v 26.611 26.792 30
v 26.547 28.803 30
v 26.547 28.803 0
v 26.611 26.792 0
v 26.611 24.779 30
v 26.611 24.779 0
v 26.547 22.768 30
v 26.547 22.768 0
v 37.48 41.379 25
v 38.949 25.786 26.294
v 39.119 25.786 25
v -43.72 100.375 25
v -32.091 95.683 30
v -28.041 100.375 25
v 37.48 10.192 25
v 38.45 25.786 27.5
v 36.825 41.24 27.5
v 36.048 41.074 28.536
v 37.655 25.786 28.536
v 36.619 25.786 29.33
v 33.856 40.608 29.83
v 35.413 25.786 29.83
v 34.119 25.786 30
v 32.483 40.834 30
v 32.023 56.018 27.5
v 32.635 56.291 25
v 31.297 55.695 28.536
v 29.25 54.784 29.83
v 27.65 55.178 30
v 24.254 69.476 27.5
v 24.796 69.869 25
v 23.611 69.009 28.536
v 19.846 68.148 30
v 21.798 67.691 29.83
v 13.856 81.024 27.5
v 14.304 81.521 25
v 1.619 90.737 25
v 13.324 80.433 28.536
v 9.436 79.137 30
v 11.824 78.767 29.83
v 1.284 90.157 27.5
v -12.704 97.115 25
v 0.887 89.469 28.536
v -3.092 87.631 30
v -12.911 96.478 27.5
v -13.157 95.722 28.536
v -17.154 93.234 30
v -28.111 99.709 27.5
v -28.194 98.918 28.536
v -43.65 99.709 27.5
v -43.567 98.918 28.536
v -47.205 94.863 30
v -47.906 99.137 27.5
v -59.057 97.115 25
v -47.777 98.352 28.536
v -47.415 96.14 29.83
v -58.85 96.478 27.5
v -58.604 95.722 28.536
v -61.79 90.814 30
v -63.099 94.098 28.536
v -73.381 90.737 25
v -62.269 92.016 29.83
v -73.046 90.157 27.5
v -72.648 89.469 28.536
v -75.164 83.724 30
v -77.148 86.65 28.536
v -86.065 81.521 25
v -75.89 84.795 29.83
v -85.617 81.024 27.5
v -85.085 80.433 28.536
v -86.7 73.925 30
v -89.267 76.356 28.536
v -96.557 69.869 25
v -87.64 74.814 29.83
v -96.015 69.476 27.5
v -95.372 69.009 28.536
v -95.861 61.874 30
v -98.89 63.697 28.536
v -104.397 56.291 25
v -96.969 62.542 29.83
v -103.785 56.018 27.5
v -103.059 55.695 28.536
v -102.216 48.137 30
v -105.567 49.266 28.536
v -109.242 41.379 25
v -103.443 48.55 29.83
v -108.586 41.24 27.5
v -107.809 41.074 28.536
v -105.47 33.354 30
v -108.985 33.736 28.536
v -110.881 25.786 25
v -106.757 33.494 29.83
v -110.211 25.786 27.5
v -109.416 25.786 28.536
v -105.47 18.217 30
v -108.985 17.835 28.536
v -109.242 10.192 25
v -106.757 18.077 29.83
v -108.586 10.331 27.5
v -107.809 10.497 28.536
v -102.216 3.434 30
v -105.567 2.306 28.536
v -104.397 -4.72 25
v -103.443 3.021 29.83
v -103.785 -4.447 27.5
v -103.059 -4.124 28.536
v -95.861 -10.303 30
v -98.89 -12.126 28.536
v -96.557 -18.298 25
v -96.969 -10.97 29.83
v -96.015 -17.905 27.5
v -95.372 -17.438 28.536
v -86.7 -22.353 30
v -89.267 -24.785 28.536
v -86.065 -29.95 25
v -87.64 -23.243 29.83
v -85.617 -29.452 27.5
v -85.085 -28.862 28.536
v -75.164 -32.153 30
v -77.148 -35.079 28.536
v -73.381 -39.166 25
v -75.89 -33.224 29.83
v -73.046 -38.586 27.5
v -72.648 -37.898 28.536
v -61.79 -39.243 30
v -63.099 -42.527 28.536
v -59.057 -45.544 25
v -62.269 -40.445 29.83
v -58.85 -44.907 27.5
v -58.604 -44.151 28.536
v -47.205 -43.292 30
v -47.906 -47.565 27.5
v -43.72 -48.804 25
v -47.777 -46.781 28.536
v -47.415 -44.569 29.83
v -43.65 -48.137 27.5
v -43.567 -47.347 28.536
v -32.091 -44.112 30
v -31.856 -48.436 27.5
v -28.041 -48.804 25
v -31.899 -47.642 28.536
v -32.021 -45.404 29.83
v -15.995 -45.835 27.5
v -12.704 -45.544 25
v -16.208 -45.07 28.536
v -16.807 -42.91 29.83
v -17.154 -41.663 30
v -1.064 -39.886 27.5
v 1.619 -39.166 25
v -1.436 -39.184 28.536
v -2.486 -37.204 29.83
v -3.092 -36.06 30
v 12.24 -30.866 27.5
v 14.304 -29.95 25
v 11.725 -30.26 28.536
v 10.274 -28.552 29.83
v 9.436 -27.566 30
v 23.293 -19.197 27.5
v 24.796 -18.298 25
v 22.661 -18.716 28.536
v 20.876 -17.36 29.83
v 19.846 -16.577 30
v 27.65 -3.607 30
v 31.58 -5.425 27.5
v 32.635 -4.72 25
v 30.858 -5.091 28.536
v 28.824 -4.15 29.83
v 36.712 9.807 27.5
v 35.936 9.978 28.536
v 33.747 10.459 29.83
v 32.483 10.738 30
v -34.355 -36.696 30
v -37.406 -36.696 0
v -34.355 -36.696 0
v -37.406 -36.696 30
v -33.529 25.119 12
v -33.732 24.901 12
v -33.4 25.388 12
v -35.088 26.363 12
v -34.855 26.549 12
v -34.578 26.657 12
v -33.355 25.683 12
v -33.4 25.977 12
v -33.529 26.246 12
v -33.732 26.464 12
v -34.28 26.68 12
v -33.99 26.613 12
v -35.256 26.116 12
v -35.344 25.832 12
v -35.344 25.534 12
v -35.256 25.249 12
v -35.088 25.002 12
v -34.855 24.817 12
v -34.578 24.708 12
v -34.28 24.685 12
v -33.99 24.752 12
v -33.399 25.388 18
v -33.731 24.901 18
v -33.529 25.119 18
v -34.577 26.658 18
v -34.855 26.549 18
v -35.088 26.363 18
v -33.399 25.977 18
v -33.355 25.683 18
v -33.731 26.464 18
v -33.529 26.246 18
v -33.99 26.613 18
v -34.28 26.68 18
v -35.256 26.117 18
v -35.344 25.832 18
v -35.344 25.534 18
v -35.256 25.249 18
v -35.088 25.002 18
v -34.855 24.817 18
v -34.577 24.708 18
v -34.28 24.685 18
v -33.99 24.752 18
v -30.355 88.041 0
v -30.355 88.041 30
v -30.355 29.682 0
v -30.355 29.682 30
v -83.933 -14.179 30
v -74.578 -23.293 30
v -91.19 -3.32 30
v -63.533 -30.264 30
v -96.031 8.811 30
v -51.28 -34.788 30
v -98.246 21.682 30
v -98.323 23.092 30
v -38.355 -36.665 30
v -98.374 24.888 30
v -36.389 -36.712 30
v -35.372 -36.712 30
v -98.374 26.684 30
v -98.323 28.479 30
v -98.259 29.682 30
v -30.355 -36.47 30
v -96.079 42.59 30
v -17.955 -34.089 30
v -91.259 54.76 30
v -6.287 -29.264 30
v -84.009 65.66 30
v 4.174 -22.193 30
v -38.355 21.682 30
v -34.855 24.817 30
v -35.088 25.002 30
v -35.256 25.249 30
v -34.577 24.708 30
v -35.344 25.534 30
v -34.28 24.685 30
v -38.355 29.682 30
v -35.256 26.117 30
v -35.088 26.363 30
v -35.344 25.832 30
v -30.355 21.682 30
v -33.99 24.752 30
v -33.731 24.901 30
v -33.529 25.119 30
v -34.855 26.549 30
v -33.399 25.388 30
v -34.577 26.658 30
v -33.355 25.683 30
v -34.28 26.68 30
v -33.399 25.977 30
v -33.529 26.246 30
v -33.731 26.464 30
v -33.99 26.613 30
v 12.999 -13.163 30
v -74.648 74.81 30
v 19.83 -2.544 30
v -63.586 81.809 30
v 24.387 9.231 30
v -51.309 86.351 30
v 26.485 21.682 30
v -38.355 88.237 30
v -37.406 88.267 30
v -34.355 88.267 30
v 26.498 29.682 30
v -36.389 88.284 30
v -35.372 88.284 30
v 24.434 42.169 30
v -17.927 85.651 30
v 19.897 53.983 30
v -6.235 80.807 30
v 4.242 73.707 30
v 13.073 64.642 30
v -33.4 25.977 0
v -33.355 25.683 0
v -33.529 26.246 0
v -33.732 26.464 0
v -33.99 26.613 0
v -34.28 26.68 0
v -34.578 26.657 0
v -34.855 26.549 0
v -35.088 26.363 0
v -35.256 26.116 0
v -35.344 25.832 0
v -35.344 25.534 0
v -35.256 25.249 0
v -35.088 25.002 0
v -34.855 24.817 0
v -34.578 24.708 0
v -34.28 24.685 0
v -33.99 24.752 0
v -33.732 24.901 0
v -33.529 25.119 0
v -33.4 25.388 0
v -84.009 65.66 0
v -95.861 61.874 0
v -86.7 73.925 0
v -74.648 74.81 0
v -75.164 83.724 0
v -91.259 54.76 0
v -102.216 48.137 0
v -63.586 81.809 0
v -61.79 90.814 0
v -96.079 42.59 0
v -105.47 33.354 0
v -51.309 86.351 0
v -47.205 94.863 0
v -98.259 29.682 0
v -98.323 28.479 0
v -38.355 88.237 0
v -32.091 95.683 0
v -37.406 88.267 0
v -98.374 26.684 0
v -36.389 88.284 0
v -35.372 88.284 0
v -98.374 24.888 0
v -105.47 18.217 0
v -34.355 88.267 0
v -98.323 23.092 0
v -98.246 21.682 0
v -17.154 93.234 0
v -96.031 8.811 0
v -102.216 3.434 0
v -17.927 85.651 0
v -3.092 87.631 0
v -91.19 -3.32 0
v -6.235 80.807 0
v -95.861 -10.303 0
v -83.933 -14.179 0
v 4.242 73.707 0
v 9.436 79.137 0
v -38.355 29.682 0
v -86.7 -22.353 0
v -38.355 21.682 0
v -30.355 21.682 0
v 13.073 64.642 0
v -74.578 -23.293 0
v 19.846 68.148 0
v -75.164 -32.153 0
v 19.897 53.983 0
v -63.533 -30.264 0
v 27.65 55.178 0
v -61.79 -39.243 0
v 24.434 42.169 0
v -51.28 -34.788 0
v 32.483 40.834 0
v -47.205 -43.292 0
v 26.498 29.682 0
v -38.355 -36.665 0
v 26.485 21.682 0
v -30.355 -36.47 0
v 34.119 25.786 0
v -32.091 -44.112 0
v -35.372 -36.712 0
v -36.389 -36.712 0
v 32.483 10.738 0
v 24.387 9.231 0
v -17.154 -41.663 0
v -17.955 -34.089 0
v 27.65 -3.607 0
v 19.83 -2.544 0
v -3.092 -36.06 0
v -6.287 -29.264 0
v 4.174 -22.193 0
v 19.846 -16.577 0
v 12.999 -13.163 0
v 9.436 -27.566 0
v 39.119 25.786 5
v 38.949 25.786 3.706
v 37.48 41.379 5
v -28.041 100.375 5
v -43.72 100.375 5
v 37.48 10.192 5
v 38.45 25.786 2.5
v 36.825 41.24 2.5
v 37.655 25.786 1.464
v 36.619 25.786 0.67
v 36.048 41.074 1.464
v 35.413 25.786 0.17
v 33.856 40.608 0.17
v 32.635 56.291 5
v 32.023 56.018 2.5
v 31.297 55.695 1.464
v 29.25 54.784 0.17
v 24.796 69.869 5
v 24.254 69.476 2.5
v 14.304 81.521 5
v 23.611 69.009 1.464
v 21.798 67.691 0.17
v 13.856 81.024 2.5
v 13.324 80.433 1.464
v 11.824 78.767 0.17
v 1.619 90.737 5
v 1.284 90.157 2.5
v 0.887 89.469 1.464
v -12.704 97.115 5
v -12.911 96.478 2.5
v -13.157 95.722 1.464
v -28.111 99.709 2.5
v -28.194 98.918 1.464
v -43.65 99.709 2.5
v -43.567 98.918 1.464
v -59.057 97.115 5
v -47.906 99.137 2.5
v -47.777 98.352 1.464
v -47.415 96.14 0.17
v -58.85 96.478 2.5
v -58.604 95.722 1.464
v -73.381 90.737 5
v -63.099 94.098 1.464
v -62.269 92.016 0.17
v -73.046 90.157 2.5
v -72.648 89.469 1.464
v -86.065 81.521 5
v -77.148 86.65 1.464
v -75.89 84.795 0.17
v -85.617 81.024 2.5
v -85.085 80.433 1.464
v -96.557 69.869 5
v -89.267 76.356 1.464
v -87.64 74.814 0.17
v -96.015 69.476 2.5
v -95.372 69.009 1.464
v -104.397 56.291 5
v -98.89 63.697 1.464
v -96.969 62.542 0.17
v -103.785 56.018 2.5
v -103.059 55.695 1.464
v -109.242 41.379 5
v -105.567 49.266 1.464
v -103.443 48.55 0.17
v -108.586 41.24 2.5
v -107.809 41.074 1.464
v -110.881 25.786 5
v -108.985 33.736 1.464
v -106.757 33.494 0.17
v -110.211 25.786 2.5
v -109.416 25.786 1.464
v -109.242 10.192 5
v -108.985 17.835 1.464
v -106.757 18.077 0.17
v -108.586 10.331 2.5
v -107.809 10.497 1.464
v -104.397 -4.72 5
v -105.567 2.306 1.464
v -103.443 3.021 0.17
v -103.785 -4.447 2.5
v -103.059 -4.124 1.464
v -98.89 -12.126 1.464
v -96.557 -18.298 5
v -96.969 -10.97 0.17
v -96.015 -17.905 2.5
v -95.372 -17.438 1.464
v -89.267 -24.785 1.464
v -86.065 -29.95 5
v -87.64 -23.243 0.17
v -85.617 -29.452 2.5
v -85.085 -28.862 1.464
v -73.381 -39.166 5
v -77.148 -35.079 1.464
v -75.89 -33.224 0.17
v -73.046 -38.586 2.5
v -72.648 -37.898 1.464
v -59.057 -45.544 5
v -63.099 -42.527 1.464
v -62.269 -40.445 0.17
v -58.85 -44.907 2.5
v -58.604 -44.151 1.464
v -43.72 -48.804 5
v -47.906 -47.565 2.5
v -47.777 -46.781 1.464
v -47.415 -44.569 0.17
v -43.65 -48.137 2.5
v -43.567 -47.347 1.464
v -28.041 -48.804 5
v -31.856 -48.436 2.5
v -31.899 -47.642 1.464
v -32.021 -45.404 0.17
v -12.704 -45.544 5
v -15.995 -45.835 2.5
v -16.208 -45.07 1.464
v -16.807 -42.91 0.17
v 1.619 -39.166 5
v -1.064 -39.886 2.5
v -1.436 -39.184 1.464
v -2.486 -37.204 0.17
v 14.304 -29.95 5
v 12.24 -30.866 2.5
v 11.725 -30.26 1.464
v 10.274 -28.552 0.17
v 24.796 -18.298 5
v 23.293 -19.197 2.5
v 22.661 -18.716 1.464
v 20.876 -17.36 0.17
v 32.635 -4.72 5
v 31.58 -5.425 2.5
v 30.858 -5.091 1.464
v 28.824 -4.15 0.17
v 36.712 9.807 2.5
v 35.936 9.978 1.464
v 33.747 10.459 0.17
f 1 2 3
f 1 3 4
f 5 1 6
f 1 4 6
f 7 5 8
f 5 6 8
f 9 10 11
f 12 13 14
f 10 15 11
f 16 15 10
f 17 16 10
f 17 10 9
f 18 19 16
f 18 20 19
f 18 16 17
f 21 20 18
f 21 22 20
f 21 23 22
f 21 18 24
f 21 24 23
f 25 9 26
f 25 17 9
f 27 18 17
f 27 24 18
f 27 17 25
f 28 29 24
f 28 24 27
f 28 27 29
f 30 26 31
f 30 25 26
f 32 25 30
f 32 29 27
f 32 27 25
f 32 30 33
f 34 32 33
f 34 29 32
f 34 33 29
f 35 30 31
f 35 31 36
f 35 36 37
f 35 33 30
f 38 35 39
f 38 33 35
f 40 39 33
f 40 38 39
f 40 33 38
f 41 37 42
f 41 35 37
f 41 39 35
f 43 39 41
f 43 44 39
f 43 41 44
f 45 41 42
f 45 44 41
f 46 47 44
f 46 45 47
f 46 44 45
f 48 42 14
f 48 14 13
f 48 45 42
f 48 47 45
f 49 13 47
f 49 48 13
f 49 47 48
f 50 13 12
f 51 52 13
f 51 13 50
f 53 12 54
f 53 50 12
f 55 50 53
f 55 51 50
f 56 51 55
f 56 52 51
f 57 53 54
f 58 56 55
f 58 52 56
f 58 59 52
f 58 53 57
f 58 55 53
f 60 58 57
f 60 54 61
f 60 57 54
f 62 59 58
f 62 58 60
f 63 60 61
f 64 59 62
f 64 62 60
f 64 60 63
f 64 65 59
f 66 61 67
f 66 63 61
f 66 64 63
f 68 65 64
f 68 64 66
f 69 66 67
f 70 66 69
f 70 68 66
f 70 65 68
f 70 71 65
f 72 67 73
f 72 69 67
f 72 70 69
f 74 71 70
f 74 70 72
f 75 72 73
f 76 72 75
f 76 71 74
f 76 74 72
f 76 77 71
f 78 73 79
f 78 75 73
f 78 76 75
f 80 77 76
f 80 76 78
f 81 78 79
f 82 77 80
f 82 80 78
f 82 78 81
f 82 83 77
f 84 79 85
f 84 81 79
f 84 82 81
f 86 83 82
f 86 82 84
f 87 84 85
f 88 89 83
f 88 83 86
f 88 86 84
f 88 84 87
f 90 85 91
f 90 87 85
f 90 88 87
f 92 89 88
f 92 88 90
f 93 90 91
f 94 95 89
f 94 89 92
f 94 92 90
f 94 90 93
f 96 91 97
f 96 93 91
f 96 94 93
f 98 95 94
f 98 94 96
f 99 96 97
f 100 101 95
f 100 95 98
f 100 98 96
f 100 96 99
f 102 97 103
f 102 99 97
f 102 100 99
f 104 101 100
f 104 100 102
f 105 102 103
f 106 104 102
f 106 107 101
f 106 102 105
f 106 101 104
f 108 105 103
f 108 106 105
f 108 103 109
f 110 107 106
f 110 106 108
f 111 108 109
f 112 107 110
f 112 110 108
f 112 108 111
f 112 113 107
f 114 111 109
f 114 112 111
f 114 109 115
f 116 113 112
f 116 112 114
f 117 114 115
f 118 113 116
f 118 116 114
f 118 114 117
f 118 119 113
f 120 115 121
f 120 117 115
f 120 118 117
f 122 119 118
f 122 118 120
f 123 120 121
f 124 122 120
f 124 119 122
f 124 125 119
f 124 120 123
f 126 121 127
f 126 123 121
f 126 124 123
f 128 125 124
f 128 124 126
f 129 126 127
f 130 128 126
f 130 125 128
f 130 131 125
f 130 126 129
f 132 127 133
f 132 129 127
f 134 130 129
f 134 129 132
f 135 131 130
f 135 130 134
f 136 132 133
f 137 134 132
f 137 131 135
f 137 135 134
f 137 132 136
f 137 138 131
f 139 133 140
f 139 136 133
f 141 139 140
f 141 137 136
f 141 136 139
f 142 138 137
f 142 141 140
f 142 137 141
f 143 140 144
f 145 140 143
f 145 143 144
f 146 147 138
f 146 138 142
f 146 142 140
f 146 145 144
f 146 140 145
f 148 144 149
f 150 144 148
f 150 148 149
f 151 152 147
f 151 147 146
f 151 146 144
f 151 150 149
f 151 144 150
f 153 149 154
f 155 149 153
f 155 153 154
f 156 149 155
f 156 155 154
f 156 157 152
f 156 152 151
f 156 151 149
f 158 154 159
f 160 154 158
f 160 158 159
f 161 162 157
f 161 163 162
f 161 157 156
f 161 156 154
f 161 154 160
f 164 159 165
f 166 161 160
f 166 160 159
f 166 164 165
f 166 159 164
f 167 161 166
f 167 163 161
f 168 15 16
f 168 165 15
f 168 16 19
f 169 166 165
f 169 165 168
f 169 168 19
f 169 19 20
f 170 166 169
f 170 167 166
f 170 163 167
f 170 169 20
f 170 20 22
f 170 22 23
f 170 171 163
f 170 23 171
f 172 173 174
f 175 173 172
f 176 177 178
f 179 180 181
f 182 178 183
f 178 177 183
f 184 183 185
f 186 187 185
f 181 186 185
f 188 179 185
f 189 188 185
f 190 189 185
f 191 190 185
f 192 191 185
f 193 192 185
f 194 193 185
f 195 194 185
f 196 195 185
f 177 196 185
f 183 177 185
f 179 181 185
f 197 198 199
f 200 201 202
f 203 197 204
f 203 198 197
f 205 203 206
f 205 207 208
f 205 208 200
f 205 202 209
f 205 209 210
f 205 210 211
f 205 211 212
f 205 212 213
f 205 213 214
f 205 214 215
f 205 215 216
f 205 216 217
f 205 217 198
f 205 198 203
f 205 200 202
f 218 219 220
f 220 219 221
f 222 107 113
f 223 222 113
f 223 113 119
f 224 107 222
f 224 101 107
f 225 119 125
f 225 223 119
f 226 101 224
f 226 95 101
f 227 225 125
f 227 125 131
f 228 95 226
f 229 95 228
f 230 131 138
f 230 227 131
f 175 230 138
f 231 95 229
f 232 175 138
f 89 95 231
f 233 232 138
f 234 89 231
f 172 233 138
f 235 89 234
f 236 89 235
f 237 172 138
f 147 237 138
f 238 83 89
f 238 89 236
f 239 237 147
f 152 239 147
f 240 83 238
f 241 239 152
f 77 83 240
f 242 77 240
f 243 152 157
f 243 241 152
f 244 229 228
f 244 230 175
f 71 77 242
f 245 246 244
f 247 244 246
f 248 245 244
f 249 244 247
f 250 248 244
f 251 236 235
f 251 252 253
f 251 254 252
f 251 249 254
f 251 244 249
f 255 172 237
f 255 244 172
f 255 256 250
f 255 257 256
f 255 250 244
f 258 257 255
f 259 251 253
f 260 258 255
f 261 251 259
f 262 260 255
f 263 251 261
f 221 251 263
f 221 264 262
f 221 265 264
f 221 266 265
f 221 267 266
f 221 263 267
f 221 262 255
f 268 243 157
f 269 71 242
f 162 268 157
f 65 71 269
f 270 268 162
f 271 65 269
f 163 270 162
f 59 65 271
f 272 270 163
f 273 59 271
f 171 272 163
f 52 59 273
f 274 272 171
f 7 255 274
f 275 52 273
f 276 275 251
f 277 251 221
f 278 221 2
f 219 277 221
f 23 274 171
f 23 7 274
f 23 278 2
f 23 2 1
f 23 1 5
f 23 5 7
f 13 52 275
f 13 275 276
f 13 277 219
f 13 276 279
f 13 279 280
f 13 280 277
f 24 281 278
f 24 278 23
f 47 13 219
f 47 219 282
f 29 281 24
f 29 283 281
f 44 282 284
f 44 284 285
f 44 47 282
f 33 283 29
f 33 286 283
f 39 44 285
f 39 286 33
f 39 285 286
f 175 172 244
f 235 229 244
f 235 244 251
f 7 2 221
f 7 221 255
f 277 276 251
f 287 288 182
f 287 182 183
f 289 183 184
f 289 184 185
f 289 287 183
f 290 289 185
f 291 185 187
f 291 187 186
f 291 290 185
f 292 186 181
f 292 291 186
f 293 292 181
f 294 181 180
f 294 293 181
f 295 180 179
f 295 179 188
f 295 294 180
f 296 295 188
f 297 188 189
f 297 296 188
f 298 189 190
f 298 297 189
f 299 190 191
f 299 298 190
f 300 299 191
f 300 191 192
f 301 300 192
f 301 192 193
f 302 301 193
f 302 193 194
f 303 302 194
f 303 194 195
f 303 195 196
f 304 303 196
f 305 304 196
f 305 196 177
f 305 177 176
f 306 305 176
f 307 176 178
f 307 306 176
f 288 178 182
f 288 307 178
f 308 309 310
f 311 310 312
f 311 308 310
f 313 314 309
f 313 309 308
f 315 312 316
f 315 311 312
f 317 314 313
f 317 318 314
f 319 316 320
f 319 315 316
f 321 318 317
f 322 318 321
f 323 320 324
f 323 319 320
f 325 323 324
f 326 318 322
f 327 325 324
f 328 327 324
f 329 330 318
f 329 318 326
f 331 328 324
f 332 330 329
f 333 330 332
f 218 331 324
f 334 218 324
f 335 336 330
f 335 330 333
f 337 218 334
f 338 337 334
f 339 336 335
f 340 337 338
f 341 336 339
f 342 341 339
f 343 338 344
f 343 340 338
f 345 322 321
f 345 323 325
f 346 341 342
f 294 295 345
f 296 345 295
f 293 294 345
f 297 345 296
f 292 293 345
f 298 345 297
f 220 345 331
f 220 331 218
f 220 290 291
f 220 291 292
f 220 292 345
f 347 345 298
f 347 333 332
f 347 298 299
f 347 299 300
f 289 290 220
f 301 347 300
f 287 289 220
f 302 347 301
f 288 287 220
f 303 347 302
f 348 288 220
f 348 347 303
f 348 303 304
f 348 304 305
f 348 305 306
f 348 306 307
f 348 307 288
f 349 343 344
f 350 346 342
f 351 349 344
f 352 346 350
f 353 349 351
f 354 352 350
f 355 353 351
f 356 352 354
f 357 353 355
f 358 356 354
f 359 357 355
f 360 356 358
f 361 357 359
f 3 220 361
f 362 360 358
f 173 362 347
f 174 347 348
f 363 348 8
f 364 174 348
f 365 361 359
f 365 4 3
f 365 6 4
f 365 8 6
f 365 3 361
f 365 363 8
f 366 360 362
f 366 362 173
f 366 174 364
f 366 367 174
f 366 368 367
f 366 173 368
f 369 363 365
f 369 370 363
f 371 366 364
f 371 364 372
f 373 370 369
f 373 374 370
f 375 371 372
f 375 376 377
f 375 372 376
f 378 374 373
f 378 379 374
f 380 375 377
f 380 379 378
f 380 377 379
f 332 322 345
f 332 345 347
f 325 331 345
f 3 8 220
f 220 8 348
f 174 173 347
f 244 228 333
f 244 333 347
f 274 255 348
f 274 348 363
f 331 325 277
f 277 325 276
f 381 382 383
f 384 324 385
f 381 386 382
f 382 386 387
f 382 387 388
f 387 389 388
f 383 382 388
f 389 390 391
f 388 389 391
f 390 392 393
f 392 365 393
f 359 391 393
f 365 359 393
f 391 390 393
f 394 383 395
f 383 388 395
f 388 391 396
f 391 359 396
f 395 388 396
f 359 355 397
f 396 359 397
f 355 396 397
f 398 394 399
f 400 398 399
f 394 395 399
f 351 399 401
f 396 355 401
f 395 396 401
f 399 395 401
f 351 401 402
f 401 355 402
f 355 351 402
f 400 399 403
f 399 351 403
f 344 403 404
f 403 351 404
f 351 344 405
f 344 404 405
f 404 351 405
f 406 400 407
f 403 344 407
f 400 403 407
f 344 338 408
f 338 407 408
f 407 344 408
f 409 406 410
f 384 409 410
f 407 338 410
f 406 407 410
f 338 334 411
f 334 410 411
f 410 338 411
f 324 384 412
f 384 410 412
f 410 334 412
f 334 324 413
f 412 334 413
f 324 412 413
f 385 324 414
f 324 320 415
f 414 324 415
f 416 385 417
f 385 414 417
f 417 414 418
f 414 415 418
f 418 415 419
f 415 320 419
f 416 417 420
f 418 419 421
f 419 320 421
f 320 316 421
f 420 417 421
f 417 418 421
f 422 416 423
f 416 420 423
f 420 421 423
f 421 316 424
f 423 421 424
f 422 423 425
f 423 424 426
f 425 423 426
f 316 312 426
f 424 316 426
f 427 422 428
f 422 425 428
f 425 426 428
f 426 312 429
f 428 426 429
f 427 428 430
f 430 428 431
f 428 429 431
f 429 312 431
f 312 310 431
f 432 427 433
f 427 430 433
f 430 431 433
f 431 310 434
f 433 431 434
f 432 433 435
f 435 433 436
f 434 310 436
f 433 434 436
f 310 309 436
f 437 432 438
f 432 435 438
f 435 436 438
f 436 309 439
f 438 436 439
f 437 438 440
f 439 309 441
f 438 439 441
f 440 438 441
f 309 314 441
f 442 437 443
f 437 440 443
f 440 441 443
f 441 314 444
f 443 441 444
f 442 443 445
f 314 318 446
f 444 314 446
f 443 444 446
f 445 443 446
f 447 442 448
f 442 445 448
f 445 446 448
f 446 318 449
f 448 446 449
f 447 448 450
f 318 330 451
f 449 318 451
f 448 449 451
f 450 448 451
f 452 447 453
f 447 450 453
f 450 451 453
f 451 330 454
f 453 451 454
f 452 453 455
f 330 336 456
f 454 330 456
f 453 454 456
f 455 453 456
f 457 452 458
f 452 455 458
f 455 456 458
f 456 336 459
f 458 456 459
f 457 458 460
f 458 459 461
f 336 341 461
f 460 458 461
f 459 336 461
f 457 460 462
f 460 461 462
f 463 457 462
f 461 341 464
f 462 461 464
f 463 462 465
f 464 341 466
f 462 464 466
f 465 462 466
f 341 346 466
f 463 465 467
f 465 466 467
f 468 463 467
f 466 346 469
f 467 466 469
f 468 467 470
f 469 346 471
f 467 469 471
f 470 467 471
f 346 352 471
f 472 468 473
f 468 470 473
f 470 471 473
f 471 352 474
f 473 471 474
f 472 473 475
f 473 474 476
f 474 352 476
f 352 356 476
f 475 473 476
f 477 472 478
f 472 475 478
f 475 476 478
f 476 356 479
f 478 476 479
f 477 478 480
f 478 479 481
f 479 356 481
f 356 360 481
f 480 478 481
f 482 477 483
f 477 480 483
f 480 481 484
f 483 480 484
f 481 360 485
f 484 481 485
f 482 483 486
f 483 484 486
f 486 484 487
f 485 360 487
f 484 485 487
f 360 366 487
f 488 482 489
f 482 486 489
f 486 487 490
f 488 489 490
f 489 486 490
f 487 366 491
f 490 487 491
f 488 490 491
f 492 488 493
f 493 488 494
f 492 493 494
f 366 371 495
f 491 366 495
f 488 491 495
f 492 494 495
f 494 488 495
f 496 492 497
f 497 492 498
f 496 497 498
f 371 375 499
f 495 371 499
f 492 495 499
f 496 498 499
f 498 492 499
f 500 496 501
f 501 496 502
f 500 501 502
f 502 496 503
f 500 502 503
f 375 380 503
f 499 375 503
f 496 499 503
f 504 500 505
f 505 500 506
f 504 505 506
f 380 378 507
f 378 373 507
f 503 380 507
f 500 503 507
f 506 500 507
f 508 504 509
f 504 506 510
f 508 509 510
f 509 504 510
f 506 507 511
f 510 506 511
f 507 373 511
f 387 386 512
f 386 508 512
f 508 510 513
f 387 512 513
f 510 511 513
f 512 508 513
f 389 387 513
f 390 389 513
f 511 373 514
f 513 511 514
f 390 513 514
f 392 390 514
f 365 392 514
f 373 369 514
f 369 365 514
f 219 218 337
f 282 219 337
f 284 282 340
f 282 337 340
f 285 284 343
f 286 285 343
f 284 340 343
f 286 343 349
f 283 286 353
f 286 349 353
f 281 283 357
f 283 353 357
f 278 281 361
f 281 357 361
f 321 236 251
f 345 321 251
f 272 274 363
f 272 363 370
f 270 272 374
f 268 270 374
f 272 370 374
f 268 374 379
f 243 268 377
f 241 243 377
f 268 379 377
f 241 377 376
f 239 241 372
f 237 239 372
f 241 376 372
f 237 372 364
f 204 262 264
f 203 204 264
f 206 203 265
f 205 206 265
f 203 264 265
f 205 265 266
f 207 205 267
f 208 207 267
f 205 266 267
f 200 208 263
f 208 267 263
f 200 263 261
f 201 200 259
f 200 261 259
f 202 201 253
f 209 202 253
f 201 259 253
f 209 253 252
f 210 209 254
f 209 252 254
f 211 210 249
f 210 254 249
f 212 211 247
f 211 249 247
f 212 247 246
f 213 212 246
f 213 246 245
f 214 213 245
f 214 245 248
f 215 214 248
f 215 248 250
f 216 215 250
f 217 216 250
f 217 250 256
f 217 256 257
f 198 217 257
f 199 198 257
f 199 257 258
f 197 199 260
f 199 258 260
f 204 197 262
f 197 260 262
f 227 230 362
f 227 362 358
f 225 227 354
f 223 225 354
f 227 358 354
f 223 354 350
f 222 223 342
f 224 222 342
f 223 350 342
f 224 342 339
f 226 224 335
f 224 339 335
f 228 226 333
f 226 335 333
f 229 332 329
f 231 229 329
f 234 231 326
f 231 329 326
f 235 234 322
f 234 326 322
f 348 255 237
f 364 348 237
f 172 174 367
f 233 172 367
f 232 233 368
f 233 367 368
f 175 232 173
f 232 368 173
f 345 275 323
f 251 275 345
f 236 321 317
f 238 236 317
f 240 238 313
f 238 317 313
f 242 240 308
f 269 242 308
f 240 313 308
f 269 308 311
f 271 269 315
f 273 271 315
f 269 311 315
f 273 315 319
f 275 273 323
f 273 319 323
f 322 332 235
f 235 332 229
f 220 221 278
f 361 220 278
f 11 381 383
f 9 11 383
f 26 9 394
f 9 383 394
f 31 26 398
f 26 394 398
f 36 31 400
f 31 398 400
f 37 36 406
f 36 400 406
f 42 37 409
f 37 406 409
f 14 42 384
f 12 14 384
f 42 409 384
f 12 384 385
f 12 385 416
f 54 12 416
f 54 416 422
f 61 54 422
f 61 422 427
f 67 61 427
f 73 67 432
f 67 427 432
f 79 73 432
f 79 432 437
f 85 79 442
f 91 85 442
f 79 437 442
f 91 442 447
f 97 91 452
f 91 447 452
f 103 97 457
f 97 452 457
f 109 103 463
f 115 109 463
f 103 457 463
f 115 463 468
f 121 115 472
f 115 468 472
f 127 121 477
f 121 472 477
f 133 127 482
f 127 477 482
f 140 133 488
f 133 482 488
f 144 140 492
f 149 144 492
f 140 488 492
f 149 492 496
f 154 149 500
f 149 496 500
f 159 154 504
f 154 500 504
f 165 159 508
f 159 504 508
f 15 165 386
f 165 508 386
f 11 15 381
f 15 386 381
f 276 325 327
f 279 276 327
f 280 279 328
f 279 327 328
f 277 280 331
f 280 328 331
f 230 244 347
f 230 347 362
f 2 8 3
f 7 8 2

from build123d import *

# Parameters (mm, degrees)
F0_R      = 75
F1_DEPTH  = 30
F2_R      = 5
F3_R      = 5
F4_R      = 62.5
F5_DEPTH  = 30
F7_E2_W   = 124.9627603046
F7_E2_H   = 30
F8_DEPTH  = 4
F10_E3_W  = 124.8690485954
F10_E3_H  = 30
F11_DEPTH = 4
F12_R     = 1
F13_DEPTH = 12
F14_R     = 1
F15_DEPTH = 12


with BuildPart() as f1:
    # F0 (on Top) → F1 (new body)
    with BuildSketch(Plane.XY):
        with Locations((-35.8805991709, 25.7855858654)):
            Circle(F0_R)
    extrude(amount=F1_DEPTH)

    # F2
    f2_edges = [f1.edges().sort_by_distance(p)[0] for p in [
        (-110.880599, 25.785586, 0),
    ]]
    fillet(f2_edges, radius=F2_R)

    # F3
    f3_edges = [f1.edges().sort_by_distance(p)[0] for p in [
        (-110.880599, 25.785586, 30),
    ]]
    fillet(f3_edges, radius=F3_R)

    # F4 (on face) → F5 (cut)
    with BuildSketch(Plane(origin=(0, 0, 0), x_dir=(1, 0, 0), z_dir=(0, 0, -1))):
        with Locations((-35.8805991709, -25.7855858654)):
            Circle(F4_R)
    extrude(amount=-F5_DEPTH, mode=Mode.SUBTRACT)

    # F7_E2 (on explicit) → F8 (join, symmetric)
    with BuildSketch(Plane(origin=(-34.3551044097, 88.2669660177, 0), x_dir=(0, -1, 0), z_dir=(-1, 0, 0))):
        with Locations((62.4813801523, 15)):
            Rectangle(F7_E2_W, F7_E2_H)
    extrude(amount=F8_DEPTH, both=True)

    # F10_E3 (on explicit) → F11 (join, symmetric)
    with BuildSketch(Plane(origin=(-98.322533071, 25.6824456155, 0), x_dir=(1, 0, 0), z_dir=(0, -1, 0))):
        with Locations((62.4345242977, 15)):
            Rectangle(F10_E3_W, F10_E3_H)
    extrude(amount=F11_DEPTH, both=True)

    # F12 (on face) → F13 (cut)
    with BuildSketch(Plane.XY.offset(30)):
        with Locations((-34.3549661338, 25.6826244295)):
            Circle(F12_R)
    extrude(amount=-F13_DEPTH, mode=Mode.SUBTRACT)

    # F14 (on Top) → F15 (cut)
    with BuildSketch(Plane.XY):
        with Locations((-34.3551188707, 25.6825555116)):
            Circle(F14_R)
    extrude(amount=F15_DEPTH, mode=Mode.SUBTRACT)


solid = f1.part
